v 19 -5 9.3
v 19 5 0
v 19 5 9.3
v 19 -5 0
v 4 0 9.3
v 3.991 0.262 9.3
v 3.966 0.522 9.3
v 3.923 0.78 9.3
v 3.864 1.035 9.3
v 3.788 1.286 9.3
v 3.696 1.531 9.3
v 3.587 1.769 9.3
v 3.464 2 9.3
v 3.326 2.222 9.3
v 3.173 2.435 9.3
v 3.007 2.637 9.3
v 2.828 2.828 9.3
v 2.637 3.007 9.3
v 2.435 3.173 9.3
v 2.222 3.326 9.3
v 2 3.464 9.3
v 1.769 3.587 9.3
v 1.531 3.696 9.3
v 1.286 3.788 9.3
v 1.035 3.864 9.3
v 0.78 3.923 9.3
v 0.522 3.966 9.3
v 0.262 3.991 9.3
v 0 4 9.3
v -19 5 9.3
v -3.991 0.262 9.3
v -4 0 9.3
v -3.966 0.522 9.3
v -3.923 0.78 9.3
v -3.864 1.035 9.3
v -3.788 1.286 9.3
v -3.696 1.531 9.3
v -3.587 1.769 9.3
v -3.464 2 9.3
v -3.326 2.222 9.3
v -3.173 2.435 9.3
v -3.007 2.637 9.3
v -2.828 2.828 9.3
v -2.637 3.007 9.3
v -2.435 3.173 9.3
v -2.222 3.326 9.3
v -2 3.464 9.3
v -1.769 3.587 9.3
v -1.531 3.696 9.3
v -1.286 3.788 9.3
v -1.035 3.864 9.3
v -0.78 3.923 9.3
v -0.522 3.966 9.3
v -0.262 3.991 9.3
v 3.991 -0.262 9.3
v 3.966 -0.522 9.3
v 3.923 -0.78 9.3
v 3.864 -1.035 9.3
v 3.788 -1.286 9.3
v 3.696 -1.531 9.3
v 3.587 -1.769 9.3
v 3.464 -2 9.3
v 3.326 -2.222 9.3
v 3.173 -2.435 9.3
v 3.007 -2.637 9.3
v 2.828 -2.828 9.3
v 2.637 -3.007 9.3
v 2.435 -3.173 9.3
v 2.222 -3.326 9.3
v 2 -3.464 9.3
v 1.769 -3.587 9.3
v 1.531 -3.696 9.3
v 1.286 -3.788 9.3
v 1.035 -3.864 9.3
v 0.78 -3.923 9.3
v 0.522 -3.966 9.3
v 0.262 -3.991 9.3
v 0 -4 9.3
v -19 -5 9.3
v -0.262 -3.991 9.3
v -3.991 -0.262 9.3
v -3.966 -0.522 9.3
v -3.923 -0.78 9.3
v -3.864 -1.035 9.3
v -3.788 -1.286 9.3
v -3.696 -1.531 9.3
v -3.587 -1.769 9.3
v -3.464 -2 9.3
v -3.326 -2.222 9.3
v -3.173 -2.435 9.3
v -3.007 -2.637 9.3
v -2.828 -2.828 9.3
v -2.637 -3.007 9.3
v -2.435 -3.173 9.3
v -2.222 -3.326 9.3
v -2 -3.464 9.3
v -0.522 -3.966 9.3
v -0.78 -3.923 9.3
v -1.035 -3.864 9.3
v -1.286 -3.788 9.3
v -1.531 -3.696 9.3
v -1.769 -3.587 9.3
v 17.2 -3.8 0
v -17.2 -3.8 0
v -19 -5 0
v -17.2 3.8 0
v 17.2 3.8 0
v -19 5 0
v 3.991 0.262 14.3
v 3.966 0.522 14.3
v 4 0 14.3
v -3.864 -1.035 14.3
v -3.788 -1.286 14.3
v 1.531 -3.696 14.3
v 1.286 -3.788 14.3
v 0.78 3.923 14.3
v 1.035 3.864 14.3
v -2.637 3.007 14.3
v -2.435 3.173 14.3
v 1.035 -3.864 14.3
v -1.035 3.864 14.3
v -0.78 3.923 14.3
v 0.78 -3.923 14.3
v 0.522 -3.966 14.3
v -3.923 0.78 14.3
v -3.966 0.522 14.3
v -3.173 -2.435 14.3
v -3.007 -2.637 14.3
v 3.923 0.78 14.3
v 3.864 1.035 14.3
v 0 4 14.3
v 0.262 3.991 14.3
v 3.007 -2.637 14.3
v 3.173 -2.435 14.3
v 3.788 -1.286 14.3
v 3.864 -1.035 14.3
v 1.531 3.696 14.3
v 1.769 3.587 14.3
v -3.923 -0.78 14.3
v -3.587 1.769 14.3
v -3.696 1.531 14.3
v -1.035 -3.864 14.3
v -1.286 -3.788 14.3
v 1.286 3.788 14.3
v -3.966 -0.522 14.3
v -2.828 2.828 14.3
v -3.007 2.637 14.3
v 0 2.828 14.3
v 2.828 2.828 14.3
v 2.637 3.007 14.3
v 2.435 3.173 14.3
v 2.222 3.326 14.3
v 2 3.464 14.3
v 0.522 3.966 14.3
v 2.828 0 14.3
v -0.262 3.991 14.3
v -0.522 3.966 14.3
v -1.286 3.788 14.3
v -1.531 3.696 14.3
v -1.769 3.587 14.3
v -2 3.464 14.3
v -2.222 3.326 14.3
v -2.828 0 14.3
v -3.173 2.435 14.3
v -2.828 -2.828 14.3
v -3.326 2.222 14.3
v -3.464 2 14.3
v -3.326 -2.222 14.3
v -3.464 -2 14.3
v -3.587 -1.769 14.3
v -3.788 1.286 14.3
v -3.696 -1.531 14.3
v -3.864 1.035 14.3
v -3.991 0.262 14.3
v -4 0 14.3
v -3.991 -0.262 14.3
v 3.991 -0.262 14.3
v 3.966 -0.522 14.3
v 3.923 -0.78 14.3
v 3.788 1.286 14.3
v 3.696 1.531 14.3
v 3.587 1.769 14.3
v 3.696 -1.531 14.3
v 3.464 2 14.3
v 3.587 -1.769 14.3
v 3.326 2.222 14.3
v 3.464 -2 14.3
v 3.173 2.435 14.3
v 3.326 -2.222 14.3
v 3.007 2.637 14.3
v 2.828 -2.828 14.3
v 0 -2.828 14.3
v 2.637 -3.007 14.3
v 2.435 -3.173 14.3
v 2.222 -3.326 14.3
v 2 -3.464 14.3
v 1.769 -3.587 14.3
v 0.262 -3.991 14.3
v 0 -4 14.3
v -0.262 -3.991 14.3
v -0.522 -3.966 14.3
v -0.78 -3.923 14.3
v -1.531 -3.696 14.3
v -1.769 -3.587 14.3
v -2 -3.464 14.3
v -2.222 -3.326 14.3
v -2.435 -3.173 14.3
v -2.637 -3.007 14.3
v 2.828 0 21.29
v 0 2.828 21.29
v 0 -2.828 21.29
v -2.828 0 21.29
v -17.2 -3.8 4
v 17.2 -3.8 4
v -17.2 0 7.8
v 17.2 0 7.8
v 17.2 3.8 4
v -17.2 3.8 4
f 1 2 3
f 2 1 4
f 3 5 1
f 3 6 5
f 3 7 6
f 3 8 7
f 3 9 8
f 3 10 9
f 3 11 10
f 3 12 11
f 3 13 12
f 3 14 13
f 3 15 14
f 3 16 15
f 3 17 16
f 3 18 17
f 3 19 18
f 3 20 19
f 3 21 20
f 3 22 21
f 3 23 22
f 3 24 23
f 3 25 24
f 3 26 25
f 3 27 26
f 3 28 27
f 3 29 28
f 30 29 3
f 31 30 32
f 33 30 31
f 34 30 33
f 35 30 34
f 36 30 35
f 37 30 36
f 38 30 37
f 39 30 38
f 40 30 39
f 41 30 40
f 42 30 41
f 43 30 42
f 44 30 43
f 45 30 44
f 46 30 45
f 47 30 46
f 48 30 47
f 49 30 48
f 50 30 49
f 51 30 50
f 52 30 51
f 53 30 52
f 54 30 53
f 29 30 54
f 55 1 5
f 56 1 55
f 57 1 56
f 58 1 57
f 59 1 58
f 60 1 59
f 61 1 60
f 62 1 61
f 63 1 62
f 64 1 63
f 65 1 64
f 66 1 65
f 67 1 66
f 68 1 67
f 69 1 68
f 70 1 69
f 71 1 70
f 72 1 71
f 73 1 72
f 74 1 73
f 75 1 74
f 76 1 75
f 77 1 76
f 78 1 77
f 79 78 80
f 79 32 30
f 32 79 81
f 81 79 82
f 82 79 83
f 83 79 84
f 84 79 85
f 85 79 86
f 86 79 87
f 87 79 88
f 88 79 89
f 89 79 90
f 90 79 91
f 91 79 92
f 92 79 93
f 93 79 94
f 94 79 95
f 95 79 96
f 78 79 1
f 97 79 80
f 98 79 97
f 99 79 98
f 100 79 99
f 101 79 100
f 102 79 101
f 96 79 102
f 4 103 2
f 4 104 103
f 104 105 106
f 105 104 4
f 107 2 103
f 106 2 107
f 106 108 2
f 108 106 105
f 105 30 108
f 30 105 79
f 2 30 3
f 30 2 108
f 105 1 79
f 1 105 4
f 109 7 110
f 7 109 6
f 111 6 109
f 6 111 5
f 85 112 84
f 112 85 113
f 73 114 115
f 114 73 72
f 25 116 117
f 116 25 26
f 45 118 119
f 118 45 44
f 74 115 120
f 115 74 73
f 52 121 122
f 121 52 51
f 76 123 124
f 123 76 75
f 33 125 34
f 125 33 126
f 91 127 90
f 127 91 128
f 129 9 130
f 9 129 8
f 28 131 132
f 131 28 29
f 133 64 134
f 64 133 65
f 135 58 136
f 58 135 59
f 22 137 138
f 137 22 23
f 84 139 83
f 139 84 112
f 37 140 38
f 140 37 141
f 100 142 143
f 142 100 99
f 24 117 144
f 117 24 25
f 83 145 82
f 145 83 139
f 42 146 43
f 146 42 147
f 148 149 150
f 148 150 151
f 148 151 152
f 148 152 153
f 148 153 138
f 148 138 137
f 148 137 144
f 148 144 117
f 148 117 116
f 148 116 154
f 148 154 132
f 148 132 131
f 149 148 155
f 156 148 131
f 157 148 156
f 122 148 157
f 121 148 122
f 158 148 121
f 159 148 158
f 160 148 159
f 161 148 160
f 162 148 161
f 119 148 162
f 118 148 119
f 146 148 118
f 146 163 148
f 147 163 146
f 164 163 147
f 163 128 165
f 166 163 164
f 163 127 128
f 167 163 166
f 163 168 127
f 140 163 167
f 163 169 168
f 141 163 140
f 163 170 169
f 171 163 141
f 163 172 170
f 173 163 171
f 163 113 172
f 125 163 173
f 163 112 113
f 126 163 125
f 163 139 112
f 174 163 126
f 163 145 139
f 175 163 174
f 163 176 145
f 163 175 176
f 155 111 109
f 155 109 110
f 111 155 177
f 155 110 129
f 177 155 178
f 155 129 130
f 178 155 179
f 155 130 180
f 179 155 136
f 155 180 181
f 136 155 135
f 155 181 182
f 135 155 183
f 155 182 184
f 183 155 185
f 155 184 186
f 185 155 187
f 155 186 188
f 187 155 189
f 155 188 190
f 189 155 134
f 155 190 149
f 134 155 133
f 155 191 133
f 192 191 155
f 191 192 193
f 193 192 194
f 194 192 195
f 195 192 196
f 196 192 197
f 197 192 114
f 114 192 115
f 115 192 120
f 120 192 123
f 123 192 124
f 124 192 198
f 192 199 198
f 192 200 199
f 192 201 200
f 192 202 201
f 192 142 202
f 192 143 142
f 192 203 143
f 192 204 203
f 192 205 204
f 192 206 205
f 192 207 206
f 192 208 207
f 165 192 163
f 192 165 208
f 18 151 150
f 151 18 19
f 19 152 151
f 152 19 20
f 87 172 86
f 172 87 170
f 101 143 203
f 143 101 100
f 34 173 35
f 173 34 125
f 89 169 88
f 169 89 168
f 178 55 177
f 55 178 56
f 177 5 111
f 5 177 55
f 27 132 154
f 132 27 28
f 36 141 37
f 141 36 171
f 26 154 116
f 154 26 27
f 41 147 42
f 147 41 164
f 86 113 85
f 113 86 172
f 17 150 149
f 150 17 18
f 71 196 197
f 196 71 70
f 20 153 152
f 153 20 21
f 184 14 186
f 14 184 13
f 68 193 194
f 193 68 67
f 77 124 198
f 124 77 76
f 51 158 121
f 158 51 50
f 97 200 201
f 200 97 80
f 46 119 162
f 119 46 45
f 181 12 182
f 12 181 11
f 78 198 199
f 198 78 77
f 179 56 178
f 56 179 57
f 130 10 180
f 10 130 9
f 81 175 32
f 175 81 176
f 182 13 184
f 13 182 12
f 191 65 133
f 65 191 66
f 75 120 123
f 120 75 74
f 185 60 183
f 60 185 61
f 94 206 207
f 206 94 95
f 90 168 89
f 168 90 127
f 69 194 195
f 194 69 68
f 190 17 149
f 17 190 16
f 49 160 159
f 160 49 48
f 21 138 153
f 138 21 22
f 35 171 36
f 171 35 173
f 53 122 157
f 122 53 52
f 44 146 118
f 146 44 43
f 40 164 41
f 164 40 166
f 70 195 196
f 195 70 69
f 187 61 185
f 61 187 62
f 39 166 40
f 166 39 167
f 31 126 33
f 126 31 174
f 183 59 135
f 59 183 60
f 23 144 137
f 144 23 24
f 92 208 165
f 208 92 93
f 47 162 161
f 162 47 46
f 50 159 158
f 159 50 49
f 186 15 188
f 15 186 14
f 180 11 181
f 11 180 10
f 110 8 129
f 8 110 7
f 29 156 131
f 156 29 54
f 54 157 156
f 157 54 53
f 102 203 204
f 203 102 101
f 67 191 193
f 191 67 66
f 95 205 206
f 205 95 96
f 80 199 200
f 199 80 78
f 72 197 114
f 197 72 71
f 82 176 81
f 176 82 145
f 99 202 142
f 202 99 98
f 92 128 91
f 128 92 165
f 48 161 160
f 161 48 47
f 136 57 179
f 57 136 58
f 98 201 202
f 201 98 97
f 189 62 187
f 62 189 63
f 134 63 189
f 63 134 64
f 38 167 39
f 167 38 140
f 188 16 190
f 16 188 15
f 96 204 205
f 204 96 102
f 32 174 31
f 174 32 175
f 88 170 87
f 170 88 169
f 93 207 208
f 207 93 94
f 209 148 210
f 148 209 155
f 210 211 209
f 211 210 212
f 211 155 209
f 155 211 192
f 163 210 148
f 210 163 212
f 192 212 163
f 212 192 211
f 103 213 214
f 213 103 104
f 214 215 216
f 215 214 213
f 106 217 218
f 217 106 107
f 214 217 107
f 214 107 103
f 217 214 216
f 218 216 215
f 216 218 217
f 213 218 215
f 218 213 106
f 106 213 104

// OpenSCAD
include <../lib/servo-duct-manifold-lib.scad>;
$fn = 96;
valve_coupler();
